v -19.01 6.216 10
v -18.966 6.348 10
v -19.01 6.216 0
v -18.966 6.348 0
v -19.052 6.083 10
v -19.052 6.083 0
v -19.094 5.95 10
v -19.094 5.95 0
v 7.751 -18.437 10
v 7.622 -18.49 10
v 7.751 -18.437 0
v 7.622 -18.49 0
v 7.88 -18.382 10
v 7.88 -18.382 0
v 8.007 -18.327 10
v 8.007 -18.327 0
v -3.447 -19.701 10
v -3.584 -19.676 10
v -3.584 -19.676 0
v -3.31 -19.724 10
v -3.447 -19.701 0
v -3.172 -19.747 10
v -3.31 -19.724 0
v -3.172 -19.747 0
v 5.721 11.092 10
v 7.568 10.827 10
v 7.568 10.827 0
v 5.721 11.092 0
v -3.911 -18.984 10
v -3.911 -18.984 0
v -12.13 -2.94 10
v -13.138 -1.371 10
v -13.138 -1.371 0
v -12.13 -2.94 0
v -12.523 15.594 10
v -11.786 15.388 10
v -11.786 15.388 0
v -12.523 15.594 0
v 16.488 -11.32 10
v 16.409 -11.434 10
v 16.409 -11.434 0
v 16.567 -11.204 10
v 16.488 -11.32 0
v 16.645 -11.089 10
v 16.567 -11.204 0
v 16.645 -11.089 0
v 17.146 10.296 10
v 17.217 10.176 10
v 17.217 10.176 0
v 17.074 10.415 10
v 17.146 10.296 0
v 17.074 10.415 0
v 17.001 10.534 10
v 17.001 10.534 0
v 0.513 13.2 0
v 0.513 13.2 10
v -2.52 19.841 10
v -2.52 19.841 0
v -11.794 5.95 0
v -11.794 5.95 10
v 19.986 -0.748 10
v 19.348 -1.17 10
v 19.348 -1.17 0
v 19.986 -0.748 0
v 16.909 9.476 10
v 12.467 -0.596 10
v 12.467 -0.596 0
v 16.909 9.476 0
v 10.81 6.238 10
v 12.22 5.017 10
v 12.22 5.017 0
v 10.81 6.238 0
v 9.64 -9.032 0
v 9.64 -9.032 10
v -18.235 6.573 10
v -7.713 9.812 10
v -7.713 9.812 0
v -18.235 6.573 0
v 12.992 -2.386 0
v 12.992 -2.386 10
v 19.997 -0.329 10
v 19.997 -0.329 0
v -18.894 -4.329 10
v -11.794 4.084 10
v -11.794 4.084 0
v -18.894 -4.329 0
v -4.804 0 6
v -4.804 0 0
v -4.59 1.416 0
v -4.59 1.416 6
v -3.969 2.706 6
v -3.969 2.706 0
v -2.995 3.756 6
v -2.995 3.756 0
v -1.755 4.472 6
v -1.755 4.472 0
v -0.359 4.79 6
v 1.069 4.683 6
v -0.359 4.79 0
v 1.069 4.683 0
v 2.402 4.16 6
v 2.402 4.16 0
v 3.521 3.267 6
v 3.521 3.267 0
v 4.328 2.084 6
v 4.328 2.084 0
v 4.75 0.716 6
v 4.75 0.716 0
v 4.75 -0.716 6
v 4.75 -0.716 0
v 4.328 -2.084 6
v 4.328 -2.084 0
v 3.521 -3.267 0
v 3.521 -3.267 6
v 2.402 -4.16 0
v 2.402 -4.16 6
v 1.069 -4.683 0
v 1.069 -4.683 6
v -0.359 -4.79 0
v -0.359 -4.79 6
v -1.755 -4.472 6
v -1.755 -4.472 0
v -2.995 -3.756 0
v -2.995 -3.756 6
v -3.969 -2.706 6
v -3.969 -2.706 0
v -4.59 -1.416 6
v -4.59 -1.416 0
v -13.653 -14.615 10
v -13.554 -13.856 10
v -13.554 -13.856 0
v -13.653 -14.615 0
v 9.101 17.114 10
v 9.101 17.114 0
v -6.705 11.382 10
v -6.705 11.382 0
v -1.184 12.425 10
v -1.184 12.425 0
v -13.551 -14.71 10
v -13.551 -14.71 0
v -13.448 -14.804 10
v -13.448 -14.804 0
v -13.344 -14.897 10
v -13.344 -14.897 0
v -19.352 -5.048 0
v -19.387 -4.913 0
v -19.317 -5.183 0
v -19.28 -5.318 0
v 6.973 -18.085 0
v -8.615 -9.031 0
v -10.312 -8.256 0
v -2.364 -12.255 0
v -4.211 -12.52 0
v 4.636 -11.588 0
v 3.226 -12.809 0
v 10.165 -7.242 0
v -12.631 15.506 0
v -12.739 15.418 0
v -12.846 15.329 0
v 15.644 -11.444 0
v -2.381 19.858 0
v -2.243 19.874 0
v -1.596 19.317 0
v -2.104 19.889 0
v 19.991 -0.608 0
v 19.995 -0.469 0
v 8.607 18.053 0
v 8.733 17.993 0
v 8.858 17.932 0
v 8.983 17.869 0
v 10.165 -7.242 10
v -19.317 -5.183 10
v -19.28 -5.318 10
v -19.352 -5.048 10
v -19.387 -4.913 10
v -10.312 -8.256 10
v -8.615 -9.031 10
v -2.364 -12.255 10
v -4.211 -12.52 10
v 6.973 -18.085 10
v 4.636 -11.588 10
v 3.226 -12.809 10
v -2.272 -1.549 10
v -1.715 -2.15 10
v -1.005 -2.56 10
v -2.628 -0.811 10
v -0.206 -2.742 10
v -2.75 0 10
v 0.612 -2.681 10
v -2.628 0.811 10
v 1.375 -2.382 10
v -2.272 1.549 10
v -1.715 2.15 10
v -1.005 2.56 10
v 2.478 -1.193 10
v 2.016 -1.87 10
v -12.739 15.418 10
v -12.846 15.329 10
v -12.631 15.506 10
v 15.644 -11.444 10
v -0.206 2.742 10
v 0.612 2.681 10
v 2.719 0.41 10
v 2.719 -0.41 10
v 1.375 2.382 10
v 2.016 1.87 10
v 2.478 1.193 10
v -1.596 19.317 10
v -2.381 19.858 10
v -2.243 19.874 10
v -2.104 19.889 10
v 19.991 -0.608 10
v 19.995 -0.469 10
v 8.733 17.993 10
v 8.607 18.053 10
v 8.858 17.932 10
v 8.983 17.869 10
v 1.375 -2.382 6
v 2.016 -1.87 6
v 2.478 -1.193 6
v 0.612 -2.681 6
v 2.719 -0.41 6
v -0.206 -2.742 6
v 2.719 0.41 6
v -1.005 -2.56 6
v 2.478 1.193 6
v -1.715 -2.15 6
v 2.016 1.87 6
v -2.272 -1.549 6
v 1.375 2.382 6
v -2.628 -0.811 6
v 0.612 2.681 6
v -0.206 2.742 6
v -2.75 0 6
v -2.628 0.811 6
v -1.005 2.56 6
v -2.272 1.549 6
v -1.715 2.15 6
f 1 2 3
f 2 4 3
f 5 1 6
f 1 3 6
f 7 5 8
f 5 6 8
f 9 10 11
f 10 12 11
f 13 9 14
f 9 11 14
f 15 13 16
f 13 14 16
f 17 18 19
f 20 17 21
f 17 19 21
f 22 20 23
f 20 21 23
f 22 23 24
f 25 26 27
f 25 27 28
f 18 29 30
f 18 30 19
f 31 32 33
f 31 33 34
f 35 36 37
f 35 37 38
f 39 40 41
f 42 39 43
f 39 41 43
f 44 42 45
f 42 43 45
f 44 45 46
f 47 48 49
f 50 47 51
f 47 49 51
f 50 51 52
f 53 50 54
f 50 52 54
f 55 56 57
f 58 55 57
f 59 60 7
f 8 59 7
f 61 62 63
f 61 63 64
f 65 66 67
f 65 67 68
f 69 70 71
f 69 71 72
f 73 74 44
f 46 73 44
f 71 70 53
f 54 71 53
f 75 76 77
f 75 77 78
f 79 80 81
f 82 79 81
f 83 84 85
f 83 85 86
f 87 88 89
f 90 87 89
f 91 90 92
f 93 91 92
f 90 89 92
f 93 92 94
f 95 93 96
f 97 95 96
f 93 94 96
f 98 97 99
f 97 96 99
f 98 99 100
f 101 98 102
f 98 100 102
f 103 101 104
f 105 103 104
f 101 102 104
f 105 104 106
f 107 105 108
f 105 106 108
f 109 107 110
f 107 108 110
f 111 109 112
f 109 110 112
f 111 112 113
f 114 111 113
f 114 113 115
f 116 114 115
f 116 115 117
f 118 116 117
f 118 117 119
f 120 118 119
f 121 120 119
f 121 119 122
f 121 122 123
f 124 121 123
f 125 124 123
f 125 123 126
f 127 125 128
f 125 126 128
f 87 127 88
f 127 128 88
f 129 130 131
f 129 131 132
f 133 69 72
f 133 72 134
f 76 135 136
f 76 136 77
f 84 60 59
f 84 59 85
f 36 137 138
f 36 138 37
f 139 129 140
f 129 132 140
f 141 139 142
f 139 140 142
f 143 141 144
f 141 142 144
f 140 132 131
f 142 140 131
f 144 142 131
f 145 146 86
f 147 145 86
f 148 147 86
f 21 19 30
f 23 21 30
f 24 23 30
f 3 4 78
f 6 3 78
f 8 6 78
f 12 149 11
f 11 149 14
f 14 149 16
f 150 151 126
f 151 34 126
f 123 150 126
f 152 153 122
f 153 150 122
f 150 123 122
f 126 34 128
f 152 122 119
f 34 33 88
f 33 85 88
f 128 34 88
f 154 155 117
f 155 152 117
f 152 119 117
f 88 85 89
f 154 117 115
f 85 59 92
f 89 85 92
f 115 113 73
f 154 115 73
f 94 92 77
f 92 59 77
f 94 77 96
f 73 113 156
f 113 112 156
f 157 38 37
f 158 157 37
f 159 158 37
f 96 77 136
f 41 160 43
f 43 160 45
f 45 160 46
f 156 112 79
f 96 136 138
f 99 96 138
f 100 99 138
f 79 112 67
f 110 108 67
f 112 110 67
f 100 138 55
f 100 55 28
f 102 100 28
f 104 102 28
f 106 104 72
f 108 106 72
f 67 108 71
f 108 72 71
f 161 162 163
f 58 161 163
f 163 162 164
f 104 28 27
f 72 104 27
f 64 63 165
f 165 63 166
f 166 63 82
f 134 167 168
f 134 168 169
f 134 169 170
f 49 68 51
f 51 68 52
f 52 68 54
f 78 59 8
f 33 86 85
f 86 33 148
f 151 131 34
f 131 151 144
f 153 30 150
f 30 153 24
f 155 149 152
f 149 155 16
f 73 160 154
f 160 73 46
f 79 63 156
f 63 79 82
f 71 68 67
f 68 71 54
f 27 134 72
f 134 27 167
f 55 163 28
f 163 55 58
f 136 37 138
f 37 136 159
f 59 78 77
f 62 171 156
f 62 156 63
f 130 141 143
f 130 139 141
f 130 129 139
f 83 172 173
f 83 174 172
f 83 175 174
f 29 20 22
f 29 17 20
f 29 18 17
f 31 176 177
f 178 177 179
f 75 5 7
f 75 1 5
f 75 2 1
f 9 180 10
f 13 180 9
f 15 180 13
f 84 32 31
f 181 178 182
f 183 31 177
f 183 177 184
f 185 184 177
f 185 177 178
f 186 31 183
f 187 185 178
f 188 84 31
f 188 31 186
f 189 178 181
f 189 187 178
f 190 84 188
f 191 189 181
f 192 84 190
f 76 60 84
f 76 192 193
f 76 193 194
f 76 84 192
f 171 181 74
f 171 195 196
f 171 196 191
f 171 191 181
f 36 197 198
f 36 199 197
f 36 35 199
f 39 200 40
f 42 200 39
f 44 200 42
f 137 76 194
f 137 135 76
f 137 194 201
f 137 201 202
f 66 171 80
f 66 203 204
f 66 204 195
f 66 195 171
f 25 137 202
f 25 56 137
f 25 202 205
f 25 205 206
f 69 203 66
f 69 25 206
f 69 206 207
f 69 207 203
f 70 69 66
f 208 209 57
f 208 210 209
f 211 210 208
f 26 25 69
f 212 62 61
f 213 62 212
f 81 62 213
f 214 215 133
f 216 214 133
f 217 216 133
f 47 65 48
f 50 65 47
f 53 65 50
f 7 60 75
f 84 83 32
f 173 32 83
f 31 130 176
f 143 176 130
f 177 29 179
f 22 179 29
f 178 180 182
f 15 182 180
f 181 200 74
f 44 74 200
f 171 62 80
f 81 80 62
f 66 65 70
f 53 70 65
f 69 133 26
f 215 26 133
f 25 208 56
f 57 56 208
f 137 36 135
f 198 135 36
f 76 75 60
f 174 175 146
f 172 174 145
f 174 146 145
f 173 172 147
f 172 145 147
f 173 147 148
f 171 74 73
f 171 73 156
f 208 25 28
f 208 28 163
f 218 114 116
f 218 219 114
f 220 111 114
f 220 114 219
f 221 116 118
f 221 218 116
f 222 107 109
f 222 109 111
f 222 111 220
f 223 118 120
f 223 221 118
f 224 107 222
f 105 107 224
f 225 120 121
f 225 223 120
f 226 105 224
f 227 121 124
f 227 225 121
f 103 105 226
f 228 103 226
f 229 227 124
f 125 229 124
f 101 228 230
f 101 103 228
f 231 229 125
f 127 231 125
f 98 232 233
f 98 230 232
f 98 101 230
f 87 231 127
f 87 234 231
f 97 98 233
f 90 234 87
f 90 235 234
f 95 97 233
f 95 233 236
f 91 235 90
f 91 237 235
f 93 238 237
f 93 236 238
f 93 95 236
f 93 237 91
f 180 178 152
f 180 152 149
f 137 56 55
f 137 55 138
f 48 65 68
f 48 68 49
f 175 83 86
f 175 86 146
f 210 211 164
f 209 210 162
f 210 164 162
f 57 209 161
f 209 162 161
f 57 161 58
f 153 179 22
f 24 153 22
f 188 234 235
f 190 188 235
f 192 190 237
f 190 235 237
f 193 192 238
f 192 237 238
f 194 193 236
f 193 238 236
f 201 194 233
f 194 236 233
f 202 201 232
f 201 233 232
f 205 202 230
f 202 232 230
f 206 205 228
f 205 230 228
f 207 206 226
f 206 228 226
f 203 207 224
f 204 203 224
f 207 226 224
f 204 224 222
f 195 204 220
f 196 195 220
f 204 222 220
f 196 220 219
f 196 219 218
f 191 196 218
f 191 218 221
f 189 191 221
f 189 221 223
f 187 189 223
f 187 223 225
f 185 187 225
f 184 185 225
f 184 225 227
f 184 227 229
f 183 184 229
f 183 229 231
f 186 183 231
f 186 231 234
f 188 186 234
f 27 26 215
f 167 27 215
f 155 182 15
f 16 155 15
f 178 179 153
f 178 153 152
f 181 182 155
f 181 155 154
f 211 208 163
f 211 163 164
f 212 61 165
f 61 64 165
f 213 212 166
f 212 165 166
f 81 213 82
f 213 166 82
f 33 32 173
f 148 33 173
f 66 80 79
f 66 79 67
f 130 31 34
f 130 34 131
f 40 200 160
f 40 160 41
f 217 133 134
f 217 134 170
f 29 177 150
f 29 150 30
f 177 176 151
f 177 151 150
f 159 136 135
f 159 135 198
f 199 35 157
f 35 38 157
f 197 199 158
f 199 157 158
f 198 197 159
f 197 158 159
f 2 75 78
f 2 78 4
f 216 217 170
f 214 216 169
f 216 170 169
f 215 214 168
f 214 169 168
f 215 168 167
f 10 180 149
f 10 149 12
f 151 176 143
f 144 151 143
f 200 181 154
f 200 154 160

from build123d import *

# Parameters (mm, degrees)
SKETCH1_R           = 20
BOSS_EXTRUDE1_DEPTH = 10
CAVITY3_START       = 0.1
CAVITY3_DEPTH       = 9.9
CUT_EXTRUDE1_DEPTH  = 11
CIRPATTERN1_COUNT   = 11
SKETCH3_R           = 2.75
CUT_EXTRUDE2_DEPTH  = 11
SKETCH4_R           = 4.803689075
CUT_EXTRUDE3_DEPTH  = 6


# Read off the part's stored shape, not the designer's step: Cavity3
with BuildPart() as part:
    # Sketch1 → Boss-Extrude1 (new body)
    with BuildSketch(Plane.XY):
        Circle(SKETCH1_R)
    extrude(amount=BOSS_EXTRUDE1_DEPTH)

    # Cavity3 outline → Cavity3 (cut)
    with BuildSketch(Plane.XY.offset(CAVITY3_START)):
        with BuildLine():
            Line((-19.657828248, -3.683719394), (-12.793623997, 4.45))
            Line((-12.793623997, 4.45), (-12.793623997, 4.95))
            Line((-12.793623997, 4.95), (-19.377757868, 4.95))
            ThreePointArc((-19.377757868, 4.95), (-19.989485324, 0.648441592), (-19.657828248, -3.683719394))
        make_face()
    extrude(amount=CAVITY3_DEPTH, mode=Mode.SUBTRACT)

    # Sketch2 → Cut-Extrude1 (cut)
    with BuildSketch(Plane.XY.offset(10)):
        Polygon((-18.893600606, -4.32866599), (-20.741181365, -6.51795158), (-20.741181365, 5.95), (-19.377757868, 5.95), (-11.793623997, 5.95), (-11.793623997, 4.084431193), align=None)
    cut_extrude1 = extrude(amount=-CUT_EXTRUDE1_DEPTH, mode=Mode.SUBTRACT)

    # CirPattern1: Cut-Extrude1 ×11 about axis
    cirpattern1_axis = Axis((0, 0, 0), (0, 0, 1))
    for i in range(1, CIRPATTERN1_COUNT):
        add(cut_extrude1.rotate(cirpattern1_axis, i * 360 / CIRPATTERN1_COUNT), mode=Mode.SUBTRACT)

    # Sketch3 → Cut-Extrude2 (cut)
    with BuildSketch(Plane(origin=(0, 0, 0), x_dir=(-1, 0, 0), z_dir=(0, 0, -1))):
        Circle(SKETCH3_R)
    extrude(amount=-CUT_EXTRUDE2_DEPTH, mode=Mode.SUBTRACT)

    # Sketch4 → Cut-Extrude3 (cut)
    with BuildSketch(Plane(origin=(0, 0, 0), x_dir=(-1, 0, 0), z_dir=(0, 0, -1))):
        Circle(SKETCH4_R)
    extrude(amount=-CUT_EXTRUDE3_DEPTH, mode=Mode.SUBTRACT)


solid = part.part
